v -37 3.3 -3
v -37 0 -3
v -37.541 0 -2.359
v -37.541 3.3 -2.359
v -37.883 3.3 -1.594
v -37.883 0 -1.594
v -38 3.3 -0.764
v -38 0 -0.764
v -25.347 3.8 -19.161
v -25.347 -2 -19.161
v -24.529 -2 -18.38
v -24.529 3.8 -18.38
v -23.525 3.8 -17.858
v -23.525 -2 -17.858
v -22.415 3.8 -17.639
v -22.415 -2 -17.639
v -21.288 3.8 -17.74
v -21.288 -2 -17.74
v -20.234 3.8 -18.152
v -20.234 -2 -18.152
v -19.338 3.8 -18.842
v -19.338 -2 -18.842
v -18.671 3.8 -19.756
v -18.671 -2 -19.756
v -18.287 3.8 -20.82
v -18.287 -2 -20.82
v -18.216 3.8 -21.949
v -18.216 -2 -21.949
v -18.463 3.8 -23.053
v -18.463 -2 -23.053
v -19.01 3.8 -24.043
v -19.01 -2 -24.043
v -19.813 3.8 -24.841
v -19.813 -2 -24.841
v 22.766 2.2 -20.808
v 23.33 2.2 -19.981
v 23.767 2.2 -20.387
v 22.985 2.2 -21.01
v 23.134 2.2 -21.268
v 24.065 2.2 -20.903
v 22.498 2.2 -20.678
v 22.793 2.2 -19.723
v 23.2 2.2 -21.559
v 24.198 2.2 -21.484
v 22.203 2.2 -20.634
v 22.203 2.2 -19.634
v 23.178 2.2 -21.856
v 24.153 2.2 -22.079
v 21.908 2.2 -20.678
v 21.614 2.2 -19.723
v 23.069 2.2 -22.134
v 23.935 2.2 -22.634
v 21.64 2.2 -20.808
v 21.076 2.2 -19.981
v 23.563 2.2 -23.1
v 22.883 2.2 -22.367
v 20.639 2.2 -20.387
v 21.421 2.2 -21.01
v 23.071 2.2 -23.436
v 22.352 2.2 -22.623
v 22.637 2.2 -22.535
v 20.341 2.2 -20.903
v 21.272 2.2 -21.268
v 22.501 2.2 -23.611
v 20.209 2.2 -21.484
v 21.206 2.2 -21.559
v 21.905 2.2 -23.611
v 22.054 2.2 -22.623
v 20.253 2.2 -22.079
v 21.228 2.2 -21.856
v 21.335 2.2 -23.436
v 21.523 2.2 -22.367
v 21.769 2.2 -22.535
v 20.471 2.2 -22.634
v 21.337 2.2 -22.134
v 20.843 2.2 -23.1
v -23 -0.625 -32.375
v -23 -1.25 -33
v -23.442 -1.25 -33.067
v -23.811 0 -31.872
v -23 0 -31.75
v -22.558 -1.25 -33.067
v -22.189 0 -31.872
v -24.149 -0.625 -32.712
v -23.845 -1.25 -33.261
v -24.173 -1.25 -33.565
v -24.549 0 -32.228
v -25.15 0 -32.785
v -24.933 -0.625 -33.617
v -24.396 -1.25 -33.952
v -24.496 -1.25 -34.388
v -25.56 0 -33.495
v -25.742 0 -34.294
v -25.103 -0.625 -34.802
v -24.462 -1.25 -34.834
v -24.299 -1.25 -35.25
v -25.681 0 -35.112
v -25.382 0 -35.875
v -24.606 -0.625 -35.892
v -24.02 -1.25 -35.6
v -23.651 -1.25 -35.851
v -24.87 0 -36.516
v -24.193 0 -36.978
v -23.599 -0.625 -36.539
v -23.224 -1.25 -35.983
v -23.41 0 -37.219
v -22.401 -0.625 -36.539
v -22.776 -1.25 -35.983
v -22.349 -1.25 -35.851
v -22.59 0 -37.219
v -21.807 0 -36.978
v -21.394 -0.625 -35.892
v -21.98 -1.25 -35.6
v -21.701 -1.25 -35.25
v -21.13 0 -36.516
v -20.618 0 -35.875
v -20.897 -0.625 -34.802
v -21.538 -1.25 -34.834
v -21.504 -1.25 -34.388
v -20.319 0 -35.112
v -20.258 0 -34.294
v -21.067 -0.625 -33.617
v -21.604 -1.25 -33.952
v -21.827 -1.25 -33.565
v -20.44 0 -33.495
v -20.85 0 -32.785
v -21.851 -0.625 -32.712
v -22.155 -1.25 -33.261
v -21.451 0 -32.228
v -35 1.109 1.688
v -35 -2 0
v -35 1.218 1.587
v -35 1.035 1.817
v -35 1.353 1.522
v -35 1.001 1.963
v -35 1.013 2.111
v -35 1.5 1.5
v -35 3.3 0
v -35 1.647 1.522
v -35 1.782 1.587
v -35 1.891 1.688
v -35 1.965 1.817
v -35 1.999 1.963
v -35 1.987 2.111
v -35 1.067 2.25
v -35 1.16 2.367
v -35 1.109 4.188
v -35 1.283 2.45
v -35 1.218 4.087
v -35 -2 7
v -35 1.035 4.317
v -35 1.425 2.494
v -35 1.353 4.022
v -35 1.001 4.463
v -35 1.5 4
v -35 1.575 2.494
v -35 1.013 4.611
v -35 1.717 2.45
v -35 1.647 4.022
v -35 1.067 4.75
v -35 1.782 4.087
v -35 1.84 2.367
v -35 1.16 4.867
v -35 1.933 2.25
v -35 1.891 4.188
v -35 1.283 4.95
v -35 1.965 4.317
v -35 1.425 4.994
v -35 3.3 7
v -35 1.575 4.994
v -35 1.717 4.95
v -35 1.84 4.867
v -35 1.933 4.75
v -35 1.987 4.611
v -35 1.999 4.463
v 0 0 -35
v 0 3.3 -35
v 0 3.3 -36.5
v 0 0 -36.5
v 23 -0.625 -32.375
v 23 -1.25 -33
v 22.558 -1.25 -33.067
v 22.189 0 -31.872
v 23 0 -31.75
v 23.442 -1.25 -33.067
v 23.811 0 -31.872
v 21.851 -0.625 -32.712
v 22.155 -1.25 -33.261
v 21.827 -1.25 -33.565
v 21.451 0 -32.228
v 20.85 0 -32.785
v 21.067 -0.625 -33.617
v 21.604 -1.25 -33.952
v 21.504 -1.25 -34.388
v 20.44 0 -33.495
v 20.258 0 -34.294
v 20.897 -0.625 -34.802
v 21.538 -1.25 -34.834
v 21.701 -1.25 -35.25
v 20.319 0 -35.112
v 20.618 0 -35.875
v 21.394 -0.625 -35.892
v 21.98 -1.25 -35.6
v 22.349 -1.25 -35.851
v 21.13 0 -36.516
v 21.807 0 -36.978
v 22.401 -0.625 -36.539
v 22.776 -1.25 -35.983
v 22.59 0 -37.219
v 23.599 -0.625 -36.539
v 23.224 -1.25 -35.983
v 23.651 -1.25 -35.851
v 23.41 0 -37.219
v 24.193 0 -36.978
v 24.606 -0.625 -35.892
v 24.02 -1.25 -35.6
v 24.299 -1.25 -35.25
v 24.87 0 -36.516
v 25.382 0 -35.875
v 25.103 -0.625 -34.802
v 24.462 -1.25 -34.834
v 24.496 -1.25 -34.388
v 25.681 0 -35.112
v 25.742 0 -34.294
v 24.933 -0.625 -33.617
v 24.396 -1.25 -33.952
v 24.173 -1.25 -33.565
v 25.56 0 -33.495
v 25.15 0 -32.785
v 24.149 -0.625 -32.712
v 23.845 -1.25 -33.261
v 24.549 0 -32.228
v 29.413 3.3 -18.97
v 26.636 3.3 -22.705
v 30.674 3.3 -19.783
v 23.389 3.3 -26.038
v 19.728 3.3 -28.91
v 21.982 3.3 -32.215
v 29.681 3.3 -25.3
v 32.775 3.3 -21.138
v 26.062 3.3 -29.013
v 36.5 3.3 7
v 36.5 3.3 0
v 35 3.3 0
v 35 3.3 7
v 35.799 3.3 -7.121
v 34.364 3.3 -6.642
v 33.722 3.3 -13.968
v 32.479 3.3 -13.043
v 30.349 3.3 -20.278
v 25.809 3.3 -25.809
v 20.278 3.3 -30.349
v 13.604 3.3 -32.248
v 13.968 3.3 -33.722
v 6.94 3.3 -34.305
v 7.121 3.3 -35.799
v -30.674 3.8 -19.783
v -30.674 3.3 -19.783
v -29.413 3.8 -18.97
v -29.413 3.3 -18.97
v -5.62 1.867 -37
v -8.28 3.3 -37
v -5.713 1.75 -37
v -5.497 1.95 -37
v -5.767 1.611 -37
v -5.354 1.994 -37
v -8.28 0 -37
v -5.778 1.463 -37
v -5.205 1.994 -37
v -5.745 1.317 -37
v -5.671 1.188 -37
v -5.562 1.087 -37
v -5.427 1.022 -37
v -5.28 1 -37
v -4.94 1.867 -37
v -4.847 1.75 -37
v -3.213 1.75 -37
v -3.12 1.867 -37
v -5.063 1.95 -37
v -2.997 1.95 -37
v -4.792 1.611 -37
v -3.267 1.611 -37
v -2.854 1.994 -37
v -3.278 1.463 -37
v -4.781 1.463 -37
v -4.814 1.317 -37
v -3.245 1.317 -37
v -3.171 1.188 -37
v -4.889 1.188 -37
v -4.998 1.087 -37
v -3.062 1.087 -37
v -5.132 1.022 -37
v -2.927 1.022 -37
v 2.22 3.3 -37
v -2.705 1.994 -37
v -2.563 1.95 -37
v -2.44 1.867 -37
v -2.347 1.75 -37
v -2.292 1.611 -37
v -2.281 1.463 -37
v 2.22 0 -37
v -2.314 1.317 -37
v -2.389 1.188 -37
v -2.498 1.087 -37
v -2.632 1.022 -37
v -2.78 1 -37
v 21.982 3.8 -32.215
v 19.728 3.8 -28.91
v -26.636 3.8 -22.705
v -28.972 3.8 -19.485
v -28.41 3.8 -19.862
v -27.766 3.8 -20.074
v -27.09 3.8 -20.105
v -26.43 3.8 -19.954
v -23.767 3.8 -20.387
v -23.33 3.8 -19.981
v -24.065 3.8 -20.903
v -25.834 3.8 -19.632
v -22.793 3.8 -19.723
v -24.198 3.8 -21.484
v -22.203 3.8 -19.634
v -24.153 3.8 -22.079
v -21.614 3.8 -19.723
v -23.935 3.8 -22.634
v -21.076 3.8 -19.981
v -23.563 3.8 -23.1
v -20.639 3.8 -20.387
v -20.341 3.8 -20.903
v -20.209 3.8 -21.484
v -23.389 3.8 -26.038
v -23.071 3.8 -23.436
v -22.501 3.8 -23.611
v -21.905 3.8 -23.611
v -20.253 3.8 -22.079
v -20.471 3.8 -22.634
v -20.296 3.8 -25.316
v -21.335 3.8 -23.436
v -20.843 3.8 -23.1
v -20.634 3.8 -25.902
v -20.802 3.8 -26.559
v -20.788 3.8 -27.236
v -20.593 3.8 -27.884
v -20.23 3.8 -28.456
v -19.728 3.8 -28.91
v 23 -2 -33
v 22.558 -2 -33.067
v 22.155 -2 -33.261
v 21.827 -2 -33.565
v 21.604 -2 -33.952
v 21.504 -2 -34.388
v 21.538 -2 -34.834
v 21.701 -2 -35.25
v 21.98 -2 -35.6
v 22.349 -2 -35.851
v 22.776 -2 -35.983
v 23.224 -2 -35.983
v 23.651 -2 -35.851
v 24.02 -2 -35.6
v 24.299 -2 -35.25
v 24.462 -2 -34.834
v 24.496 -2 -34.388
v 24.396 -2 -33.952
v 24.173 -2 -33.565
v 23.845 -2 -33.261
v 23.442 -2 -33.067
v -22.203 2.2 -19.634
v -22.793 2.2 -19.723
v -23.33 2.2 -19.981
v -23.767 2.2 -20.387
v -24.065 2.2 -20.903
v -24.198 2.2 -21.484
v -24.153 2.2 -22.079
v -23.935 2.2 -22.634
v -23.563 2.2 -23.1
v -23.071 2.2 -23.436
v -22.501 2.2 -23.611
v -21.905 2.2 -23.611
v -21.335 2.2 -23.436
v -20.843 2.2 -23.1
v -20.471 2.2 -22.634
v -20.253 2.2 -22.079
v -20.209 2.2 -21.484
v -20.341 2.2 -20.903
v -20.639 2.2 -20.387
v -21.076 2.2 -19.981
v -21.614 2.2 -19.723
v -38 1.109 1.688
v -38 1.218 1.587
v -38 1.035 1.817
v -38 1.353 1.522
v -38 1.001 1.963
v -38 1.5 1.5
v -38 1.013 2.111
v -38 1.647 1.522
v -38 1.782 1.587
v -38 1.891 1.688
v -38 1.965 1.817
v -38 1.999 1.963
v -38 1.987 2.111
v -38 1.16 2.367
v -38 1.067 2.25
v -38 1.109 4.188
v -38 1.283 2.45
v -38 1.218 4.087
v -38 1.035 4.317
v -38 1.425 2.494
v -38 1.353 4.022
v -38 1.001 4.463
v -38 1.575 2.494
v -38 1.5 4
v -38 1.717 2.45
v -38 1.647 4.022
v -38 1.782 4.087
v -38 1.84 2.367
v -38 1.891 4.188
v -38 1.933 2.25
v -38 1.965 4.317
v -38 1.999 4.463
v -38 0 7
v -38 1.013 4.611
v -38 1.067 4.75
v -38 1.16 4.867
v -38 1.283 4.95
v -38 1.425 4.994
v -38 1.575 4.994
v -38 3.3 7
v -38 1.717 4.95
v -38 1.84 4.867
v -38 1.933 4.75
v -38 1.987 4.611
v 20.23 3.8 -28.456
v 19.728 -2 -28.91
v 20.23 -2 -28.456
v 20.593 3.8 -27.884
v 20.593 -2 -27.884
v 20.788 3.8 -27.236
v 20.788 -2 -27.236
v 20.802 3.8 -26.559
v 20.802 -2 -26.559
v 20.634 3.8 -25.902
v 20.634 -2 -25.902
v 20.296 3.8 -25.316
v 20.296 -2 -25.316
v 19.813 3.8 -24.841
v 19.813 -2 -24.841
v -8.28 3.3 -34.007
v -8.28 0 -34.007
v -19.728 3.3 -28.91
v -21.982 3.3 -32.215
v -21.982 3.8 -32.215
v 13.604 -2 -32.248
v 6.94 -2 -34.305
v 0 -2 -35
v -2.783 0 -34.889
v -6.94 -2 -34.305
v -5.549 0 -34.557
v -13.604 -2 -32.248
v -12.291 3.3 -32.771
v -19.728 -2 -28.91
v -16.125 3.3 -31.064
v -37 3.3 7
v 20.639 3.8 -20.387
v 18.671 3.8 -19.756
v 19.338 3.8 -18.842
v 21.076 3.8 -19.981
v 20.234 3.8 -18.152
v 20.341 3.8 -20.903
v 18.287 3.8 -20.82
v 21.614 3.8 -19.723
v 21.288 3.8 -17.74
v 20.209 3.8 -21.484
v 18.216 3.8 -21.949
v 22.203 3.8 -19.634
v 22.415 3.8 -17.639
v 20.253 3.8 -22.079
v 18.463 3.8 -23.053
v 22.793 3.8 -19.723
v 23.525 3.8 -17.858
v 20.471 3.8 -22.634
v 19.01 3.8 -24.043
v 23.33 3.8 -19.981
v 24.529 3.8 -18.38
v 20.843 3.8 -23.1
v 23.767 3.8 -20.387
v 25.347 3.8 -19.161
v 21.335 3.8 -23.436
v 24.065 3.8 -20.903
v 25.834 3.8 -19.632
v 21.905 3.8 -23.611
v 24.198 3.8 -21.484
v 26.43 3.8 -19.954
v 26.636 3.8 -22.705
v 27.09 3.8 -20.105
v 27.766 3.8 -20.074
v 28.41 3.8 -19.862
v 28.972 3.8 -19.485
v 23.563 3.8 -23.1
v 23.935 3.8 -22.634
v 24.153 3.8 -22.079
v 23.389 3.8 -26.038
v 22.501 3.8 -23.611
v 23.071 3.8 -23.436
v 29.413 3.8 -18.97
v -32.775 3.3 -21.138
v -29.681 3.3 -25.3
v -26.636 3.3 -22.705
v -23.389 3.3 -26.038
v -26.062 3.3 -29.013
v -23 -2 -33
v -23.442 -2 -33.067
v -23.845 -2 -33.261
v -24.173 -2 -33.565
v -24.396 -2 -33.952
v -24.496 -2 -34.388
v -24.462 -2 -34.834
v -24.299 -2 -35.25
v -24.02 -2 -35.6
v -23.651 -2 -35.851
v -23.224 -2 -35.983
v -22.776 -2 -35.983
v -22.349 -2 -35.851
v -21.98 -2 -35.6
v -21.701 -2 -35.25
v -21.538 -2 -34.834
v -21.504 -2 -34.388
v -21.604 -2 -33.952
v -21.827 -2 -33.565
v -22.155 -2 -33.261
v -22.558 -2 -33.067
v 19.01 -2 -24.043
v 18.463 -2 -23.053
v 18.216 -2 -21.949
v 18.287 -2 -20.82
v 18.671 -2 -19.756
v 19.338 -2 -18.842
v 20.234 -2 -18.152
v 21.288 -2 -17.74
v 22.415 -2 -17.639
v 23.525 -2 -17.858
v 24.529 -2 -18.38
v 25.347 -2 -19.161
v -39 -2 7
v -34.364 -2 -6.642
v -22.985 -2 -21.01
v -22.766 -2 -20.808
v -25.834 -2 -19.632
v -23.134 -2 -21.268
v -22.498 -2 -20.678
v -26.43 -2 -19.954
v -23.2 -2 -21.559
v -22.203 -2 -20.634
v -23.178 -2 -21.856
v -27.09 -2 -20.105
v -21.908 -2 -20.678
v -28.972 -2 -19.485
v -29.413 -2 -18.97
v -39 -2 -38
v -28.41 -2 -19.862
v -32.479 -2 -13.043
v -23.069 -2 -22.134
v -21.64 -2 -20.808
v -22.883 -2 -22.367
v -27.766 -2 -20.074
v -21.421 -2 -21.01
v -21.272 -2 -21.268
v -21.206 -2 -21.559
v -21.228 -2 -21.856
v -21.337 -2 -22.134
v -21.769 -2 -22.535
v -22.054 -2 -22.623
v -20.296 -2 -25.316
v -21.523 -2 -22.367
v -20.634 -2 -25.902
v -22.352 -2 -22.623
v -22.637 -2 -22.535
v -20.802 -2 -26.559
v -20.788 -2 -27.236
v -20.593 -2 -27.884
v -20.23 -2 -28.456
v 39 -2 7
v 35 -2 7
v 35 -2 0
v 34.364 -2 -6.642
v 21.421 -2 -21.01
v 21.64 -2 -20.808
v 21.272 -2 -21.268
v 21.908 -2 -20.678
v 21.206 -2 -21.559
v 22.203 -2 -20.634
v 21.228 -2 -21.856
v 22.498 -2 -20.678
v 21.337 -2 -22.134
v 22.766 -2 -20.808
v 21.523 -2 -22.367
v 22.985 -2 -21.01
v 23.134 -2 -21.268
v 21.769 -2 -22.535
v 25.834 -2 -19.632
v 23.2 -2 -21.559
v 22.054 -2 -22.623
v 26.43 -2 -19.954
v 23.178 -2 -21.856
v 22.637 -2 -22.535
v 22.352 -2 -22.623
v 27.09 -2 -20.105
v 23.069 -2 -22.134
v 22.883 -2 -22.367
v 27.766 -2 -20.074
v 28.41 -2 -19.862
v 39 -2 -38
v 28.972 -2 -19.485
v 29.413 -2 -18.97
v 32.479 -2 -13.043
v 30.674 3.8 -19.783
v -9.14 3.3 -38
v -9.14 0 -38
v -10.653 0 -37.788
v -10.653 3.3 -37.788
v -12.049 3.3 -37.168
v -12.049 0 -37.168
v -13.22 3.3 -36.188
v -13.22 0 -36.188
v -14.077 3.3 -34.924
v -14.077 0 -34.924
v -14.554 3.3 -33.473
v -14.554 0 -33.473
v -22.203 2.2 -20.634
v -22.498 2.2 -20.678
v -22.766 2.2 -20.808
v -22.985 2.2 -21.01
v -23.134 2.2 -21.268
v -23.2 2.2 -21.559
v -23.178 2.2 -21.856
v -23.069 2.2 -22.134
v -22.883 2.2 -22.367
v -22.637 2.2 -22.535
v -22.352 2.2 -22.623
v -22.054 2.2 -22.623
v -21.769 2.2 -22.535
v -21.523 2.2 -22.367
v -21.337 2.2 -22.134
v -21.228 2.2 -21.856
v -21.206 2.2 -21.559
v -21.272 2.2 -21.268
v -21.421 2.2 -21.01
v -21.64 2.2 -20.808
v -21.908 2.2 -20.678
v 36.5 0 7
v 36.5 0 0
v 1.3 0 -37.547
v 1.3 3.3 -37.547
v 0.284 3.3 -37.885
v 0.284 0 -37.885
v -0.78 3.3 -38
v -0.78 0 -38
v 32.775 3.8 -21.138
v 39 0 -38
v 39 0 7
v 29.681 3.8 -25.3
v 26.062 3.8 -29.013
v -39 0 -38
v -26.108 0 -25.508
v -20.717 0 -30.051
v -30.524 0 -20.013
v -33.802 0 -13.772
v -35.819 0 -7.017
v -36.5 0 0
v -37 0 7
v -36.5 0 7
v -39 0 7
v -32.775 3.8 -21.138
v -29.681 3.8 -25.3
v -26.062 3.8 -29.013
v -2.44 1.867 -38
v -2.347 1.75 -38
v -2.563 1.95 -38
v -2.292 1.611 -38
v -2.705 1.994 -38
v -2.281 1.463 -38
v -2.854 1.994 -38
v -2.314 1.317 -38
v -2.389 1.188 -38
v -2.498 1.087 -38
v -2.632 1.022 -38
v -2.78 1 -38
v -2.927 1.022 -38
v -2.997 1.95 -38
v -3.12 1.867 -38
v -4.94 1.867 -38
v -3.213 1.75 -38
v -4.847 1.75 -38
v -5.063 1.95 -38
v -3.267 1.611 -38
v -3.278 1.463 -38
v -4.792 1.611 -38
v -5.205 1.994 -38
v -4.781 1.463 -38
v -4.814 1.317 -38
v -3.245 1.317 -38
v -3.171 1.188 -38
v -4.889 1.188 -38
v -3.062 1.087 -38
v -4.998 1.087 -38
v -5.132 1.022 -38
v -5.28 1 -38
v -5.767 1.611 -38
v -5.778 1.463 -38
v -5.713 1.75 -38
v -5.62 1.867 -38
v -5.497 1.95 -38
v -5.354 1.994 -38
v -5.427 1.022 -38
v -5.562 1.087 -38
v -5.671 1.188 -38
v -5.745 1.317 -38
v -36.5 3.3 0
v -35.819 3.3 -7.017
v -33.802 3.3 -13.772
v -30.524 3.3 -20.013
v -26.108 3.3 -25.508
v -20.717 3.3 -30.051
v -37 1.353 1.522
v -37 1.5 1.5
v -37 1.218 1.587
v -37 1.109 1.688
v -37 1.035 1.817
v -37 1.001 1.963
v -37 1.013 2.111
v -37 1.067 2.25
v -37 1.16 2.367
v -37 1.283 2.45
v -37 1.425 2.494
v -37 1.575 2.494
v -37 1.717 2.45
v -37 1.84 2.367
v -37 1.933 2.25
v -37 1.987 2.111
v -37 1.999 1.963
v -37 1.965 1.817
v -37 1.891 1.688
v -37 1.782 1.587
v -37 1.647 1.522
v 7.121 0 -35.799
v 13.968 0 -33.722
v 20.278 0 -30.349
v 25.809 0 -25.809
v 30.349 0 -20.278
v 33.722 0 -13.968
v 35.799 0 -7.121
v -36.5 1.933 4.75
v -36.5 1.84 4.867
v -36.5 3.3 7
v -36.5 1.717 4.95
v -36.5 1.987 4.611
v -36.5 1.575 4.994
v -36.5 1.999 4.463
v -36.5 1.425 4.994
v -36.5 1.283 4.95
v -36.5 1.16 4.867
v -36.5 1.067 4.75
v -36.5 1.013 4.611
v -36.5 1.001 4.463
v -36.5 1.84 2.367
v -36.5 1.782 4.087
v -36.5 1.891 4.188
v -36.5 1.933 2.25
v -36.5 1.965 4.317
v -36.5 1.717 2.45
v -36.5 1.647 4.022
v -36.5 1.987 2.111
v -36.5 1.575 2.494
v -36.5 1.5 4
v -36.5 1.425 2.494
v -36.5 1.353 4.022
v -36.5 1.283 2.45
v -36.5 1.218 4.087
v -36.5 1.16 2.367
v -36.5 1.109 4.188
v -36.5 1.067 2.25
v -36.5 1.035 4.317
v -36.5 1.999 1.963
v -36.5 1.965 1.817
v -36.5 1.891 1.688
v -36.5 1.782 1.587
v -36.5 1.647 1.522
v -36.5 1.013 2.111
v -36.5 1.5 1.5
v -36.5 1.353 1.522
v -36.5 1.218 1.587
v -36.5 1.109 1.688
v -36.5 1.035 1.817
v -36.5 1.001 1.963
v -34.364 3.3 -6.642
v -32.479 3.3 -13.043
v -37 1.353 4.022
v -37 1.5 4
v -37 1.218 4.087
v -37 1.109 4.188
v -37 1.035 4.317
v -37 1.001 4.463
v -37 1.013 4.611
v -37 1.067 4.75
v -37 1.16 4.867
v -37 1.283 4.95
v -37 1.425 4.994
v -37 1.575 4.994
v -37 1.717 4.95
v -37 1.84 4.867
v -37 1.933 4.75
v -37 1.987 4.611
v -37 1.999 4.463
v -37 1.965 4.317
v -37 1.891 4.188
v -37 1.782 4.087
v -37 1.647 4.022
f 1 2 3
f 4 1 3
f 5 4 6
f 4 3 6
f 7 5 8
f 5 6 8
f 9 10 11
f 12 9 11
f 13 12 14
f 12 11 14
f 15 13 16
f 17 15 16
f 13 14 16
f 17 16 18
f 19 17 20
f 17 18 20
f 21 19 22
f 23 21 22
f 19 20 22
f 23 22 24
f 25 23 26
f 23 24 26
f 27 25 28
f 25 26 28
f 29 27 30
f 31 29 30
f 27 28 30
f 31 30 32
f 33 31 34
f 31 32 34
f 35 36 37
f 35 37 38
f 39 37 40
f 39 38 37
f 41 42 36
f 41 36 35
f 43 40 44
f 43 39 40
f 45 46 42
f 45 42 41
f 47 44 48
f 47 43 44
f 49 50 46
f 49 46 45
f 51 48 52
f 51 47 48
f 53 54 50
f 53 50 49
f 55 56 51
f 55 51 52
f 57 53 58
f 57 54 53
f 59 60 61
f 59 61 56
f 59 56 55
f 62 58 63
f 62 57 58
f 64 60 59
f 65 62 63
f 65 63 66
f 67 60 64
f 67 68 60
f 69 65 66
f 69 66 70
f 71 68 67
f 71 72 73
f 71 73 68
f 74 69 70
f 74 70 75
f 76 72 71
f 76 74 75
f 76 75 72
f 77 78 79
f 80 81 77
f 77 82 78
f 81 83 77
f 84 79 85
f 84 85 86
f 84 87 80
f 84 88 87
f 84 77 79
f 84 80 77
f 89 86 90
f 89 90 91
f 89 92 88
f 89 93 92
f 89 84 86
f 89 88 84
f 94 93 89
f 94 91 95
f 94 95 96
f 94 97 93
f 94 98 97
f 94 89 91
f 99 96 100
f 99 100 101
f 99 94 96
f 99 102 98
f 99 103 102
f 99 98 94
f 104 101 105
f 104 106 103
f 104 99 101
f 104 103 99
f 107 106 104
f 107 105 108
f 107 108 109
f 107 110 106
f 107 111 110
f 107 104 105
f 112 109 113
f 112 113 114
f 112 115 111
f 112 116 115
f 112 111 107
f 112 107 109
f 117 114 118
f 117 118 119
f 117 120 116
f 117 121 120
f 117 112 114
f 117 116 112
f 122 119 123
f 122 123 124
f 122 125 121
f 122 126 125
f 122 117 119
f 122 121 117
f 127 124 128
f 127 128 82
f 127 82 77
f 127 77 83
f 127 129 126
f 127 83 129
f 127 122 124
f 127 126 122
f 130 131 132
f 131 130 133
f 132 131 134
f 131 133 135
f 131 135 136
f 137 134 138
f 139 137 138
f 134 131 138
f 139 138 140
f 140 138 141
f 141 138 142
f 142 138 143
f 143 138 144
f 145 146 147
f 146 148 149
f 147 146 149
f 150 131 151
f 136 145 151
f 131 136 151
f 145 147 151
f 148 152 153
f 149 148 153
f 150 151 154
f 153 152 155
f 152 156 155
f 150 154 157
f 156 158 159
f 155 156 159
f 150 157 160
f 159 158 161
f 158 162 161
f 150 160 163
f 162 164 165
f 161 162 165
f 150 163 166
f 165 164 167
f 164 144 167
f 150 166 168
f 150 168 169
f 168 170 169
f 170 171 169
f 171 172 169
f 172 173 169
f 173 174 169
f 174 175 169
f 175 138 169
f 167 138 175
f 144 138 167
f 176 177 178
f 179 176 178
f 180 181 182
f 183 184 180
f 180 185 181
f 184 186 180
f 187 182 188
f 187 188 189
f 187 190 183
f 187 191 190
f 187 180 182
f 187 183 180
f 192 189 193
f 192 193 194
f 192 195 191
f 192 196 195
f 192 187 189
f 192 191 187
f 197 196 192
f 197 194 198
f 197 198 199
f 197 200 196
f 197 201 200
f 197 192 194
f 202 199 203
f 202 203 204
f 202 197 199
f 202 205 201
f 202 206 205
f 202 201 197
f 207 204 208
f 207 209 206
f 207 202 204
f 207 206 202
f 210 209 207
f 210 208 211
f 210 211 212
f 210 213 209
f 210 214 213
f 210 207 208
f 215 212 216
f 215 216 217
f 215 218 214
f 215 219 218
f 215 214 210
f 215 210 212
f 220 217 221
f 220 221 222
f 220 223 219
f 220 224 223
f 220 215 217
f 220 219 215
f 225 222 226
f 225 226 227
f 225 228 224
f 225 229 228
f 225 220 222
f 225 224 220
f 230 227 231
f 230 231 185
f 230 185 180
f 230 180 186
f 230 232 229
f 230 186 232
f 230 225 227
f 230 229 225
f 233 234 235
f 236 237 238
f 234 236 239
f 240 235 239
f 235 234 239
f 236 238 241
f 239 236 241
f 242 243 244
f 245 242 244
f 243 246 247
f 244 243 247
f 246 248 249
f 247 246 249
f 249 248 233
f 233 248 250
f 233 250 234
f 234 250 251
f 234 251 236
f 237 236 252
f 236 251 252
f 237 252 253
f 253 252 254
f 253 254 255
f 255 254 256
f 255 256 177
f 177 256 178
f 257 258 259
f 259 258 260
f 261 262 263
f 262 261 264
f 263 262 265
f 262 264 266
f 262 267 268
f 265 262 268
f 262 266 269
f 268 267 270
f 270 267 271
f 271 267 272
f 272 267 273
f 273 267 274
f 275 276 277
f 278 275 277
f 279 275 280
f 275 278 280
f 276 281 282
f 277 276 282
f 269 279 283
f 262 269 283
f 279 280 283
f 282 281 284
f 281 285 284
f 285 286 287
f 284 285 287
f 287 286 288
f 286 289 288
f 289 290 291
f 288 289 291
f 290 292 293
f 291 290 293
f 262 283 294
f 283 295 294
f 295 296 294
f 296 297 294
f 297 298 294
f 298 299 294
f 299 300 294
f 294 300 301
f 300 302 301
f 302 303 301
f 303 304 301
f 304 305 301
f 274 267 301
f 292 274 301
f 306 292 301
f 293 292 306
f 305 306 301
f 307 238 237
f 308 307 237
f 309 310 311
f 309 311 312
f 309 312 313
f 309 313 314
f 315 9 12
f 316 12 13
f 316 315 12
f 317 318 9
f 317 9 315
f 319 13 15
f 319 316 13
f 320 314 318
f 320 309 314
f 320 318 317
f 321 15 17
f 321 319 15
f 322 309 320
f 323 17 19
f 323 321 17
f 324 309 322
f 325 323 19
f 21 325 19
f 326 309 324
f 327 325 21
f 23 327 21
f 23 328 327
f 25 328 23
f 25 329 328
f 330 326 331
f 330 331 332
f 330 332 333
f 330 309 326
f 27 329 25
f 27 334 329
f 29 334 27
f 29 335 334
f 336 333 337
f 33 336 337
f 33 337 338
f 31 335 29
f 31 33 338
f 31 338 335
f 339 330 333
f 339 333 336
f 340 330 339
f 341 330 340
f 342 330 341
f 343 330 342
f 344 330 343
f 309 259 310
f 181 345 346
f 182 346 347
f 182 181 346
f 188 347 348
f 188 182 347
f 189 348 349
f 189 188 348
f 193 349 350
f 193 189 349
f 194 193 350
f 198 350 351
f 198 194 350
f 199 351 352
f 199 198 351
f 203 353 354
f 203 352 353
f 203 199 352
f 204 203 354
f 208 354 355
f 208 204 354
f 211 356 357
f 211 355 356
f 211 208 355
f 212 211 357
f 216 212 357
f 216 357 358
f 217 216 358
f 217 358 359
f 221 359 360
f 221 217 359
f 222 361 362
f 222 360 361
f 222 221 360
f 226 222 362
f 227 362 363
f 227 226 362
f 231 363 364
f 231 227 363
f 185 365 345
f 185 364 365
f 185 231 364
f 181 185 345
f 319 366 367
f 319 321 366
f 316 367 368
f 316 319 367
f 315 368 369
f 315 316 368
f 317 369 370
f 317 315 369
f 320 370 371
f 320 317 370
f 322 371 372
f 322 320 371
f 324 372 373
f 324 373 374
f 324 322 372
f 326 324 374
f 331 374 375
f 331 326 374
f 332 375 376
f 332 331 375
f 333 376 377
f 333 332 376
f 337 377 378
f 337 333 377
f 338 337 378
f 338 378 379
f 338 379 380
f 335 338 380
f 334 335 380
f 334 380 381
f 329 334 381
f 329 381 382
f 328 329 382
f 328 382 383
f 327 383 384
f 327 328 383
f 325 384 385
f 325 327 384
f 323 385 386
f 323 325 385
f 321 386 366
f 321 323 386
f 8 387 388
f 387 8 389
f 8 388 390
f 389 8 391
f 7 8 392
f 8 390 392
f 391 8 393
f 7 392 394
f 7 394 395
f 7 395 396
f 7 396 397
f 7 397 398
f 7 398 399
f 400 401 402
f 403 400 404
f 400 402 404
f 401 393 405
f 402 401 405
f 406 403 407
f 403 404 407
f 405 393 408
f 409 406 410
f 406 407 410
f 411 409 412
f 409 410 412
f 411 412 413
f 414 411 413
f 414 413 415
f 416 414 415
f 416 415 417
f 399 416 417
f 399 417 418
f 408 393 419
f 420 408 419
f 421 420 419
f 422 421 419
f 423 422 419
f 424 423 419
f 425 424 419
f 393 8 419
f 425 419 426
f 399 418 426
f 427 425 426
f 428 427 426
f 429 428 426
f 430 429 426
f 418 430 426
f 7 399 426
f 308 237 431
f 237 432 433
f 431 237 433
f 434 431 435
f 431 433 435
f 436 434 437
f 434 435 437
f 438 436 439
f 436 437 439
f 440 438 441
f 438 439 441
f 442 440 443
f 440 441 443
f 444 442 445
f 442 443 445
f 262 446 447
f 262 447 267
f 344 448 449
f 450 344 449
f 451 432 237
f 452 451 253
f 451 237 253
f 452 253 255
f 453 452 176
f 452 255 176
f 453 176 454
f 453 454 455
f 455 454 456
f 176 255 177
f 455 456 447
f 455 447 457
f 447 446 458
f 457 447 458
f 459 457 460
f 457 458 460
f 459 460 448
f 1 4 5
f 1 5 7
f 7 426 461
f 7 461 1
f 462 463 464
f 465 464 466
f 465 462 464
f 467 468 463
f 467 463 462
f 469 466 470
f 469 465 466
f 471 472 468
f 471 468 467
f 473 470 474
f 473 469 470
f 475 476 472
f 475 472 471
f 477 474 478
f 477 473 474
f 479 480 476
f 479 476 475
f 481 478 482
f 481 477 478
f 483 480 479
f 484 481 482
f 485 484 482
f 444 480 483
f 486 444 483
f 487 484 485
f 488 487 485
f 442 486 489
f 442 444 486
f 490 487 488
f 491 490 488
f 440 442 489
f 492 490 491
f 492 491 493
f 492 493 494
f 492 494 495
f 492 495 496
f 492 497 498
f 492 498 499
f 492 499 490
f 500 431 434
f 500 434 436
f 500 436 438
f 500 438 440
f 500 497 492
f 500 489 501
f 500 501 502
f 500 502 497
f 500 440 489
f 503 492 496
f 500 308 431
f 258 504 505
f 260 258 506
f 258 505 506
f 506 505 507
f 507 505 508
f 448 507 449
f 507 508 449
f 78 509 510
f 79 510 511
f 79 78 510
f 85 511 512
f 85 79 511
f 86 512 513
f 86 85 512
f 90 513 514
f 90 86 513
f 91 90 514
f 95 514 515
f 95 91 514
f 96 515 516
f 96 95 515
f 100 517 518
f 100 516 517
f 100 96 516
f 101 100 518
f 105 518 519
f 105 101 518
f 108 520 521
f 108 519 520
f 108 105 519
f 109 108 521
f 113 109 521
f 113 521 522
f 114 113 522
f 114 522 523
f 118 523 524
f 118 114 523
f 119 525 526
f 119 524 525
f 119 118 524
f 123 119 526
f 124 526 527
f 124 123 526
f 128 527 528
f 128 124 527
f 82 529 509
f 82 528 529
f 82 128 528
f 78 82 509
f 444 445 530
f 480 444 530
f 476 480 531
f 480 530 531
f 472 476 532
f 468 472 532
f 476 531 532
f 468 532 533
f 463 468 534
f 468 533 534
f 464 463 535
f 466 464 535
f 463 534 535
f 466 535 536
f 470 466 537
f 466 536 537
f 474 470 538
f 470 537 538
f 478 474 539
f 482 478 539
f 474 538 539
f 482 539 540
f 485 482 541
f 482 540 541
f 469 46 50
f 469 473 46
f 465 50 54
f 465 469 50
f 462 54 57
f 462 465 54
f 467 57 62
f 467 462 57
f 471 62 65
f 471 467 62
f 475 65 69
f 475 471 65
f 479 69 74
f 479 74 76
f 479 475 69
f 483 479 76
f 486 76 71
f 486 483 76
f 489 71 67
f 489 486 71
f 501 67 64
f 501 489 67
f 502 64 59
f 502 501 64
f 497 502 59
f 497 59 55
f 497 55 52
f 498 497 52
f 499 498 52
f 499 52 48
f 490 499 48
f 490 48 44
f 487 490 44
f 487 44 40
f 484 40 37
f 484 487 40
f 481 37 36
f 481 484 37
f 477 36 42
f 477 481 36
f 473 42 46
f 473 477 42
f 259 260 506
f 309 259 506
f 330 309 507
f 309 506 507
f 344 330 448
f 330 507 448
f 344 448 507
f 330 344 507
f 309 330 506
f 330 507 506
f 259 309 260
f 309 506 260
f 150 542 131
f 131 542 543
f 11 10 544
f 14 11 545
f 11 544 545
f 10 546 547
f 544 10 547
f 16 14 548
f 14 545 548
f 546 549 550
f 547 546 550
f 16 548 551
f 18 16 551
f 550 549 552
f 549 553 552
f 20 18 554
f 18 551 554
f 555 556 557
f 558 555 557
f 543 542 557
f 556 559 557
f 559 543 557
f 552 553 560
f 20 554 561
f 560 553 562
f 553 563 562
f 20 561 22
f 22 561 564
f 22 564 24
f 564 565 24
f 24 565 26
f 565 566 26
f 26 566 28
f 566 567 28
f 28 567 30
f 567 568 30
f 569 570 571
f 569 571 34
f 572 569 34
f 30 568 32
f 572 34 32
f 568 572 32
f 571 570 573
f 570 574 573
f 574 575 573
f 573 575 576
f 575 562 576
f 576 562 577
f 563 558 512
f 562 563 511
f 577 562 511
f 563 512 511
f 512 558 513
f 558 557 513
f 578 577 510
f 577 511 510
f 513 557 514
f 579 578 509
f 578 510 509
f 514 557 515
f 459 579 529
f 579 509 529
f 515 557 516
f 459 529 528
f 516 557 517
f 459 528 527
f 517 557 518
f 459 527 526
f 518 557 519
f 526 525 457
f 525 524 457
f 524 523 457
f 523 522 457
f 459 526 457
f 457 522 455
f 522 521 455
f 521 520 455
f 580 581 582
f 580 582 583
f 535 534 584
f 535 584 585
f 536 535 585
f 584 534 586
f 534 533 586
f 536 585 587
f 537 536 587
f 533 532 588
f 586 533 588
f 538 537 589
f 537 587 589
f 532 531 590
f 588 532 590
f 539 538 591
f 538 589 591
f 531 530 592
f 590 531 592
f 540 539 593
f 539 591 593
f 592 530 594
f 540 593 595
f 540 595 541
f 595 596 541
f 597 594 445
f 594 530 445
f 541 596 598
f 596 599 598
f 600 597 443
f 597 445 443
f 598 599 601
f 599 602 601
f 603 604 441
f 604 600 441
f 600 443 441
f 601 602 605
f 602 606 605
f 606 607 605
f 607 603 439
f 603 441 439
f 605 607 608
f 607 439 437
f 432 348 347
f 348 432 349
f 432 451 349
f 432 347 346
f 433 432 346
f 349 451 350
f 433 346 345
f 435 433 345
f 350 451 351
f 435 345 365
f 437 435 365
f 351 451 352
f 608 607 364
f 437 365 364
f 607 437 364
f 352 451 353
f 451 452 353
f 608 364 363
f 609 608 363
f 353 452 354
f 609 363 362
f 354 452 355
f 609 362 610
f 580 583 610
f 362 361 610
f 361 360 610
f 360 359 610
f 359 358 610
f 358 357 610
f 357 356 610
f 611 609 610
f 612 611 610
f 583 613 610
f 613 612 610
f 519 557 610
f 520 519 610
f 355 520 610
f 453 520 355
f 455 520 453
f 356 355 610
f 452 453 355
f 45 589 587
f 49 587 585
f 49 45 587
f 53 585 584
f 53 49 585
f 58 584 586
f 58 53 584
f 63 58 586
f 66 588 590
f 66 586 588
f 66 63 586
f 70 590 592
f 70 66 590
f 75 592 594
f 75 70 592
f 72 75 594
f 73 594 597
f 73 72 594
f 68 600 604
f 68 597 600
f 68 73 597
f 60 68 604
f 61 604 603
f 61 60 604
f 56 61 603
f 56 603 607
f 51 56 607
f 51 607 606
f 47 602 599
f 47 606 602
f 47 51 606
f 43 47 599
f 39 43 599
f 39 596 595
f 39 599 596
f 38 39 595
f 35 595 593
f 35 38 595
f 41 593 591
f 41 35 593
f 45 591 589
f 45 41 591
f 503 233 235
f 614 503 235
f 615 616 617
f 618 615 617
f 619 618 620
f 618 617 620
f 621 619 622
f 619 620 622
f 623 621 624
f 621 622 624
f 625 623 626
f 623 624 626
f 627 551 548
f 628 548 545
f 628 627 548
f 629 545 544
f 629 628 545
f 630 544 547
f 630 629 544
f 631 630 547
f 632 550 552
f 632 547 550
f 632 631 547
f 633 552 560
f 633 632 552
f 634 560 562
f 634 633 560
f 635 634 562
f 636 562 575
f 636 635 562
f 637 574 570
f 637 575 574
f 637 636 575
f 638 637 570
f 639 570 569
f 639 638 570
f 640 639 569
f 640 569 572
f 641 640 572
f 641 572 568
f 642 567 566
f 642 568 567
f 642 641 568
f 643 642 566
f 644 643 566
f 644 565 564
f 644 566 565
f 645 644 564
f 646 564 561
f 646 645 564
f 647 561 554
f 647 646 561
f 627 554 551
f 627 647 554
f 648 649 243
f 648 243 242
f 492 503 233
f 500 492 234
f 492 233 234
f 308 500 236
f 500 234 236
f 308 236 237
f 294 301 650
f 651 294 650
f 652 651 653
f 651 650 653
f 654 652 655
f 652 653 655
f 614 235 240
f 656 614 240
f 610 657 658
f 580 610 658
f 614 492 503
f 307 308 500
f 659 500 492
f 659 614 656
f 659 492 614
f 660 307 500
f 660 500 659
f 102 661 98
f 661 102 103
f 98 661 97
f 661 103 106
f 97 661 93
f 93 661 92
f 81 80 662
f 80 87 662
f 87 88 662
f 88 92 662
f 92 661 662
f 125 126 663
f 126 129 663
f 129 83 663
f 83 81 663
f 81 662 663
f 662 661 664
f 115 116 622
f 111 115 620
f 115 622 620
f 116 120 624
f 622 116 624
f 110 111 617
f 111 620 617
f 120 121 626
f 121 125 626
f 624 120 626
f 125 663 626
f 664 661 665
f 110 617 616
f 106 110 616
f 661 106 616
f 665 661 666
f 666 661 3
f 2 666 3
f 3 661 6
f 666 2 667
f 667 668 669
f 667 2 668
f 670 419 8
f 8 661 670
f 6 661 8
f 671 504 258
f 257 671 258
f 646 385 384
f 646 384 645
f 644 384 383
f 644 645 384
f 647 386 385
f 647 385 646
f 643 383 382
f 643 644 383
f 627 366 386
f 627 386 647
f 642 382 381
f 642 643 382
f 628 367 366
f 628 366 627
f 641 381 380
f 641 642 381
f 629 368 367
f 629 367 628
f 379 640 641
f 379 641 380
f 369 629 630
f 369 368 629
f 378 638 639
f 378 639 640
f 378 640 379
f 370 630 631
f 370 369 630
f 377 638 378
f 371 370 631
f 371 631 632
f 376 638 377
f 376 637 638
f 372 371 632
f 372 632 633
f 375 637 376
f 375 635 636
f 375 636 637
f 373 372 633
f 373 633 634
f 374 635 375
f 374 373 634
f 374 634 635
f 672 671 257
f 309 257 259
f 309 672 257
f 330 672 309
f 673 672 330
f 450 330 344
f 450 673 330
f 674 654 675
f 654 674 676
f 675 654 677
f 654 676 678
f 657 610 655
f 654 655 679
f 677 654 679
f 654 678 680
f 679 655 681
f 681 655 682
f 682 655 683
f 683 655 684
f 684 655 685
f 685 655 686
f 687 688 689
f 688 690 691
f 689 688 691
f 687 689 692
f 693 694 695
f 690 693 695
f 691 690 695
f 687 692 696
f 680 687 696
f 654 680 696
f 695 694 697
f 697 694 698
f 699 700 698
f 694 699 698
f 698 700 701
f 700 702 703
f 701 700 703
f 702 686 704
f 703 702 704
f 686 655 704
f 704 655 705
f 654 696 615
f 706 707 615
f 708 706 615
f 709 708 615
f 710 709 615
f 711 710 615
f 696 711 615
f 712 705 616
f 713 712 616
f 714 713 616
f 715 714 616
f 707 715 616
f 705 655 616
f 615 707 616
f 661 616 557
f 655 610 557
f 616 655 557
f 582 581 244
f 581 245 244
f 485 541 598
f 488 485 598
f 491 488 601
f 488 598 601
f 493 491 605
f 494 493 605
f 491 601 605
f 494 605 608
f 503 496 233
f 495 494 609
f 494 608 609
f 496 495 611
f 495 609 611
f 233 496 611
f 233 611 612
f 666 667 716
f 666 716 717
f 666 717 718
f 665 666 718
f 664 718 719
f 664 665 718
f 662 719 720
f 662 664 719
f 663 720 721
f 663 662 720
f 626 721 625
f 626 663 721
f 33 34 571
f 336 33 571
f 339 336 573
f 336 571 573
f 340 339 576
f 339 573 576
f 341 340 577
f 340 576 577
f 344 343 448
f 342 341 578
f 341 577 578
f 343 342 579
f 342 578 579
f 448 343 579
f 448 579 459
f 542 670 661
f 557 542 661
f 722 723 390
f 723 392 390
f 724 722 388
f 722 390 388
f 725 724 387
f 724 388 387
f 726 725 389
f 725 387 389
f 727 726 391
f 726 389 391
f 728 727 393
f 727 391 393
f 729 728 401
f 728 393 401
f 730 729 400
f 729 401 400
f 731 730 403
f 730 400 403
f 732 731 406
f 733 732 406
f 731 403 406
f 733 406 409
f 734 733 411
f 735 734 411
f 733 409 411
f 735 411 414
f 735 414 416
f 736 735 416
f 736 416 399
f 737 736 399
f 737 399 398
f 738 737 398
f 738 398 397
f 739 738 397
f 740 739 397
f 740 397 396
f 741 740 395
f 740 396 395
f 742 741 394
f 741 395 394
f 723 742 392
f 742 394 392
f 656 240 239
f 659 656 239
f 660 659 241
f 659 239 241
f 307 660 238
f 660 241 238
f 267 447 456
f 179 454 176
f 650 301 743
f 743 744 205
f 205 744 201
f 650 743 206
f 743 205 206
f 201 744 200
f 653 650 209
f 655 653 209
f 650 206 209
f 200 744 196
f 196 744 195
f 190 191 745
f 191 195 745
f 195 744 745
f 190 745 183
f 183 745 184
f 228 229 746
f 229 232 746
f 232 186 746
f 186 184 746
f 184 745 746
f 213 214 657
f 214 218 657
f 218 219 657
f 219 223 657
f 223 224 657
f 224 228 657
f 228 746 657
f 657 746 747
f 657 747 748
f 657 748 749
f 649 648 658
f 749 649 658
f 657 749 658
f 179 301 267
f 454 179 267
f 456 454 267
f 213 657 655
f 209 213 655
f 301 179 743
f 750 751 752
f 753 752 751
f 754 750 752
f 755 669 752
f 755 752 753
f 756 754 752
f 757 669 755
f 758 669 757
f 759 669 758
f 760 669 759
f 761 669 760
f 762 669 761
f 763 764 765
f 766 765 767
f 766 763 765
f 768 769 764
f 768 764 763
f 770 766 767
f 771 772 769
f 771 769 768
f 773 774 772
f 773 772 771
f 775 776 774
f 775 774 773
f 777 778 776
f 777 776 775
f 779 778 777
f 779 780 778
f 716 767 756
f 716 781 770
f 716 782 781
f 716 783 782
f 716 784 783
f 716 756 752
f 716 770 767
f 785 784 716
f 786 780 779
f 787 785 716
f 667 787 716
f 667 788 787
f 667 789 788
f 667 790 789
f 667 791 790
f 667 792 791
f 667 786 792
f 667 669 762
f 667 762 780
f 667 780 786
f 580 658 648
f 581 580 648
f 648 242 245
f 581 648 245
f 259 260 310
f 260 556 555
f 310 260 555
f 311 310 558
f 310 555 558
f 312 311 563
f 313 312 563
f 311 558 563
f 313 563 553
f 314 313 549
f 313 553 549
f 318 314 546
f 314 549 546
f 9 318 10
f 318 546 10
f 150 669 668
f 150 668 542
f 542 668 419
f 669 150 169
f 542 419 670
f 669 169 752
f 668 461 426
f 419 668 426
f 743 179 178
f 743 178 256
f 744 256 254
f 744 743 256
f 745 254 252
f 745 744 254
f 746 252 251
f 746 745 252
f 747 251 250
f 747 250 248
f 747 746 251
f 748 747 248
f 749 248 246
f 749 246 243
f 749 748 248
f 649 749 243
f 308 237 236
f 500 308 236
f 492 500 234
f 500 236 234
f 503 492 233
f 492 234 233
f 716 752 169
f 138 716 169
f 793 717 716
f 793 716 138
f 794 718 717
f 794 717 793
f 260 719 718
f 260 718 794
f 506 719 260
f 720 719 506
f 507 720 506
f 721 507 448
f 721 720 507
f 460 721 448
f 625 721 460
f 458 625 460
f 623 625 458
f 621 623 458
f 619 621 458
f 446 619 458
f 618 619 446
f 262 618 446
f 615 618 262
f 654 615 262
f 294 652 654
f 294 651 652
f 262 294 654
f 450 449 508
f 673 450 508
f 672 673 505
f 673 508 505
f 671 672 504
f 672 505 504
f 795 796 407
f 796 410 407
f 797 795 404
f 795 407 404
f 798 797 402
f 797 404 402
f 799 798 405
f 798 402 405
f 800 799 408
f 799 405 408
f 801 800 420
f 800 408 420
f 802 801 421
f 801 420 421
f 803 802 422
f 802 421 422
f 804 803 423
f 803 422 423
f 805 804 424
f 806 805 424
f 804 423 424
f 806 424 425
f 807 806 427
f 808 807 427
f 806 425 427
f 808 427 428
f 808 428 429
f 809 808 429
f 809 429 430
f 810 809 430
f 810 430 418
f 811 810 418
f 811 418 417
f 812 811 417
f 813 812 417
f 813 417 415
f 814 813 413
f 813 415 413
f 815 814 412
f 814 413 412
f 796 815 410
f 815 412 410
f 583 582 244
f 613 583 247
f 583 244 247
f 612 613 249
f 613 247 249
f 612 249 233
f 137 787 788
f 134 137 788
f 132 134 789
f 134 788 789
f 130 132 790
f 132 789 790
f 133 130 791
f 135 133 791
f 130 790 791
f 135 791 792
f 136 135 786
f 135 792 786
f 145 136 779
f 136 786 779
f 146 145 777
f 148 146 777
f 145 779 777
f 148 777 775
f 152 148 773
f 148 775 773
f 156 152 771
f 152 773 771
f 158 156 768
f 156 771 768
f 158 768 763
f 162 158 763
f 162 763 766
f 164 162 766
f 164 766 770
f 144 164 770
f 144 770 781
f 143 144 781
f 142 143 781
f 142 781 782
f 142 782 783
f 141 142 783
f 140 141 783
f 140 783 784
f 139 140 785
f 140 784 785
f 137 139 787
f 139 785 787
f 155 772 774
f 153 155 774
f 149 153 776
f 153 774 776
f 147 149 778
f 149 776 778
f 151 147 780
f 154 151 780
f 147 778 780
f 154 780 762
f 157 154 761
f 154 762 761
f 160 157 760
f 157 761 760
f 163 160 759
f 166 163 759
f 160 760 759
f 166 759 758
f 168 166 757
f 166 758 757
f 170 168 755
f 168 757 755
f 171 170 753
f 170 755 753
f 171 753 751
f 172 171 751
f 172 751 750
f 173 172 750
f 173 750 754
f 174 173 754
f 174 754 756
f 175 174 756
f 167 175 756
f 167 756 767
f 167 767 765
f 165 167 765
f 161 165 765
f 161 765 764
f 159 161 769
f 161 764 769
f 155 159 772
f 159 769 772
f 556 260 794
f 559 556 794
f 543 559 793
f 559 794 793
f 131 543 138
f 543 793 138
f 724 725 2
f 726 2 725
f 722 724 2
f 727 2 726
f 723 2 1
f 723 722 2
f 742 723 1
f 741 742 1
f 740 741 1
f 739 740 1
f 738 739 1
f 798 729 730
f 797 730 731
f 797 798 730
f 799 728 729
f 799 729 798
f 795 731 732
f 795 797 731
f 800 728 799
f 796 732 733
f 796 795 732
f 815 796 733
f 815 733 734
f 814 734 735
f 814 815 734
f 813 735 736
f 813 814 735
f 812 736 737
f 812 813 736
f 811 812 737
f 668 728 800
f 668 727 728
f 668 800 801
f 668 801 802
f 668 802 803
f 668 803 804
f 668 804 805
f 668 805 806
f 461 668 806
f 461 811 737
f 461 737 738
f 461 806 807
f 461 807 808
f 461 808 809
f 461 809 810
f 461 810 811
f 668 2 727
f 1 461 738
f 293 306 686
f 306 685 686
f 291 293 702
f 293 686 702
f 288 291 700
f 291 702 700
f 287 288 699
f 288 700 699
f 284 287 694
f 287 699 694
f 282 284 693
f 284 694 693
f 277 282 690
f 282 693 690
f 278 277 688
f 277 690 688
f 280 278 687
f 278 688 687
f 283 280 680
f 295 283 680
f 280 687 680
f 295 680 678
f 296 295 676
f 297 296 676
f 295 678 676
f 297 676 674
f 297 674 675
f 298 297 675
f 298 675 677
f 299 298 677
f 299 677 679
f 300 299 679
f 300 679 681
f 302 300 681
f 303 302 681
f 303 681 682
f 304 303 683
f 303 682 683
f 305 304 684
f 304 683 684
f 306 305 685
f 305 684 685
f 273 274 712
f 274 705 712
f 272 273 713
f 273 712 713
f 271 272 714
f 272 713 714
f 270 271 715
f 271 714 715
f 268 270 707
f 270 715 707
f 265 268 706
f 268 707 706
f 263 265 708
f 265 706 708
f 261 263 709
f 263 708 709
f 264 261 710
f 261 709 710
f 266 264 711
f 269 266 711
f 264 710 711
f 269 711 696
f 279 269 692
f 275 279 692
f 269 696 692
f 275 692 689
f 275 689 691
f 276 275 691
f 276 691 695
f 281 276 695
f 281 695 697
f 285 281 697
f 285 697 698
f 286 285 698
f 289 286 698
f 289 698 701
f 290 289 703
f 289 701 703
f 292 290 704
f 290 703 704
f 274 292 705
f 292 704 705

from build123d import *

# Parameters (mm, degrees)
BOSS_EXTRUDE1_DEPTH                          = 3.3
BOSS_EXTRUDE2_DEPTH                          = 2
BOSS_EXTRUDE3_DEPTH                          = 0.5
BOSS_EXTRUDE3_DEPTH_BACK                     = 5.3
BOSS_EXTRUDE4_DEPTH                          = 0.5
CBORE_FOR_M2_PAN_HEAD_SCREW2_AT_2_COUNT      = 2
CBORE_FOR_M2_PAN_HEAD_SCREW2_AT_2_PITCH      = 44.406234465
SKETCH13_W                                   = 1
SKETCH13_H                                   = 3.494688162
BOSS_EXTRUDE5_DEPTH                          = 10
FILLET1_R                                    = 3
SKETCH15_W                                   = 8.279859514
SKETCH15_H                                   = 8.940793452
CUT_EXTRUDE2_DEPTH                           = 3.3
SKETCH19_W                                   = 0.5
SKETCH19_H                                   = 5
F_1_0_1_DIAMETER_HOLE2_AT_2_COUNT            = 2
F_1_0_1_DIAMETER_HOLE2_AT_2_PITCH            = 2.5
BOSS_EXTRUDE6_DEPTH                          = 3.3
FILLET2_R                                    = 5.5
CSK_FOR_M3_COUNTERSUNK_FLAT_HEAD_SCR_2_COUNT = 2
CSK_FOR_M3_COUNTERSUNK_FLAT_HEAD_SCR_2_PITCH = 46
FILLET3_R                                    = 5
SKETCH24_W                                   = 0.5
SKETCH24_H                                   = 1
F_1_0_1_DIAMETER_HOLE3_AT_2_COUNT            = 2
F_1_0_1_DIAMETER_HOLE3_AT_2_PITCH            = 2.5


with BuildPart() as part:
    # Sketch1 → Boss-Extrude1 (new body)
    with BuildSketch(Plane(origin=(0, 0, 0), x_dir=(1, 0, 0), z_dir=(0, 1, 0))):
        with BuildLine():
            Line((36.5, 0), (36.5, -7))
            Line((36.5, -7), (35, -7))
            Line((35, -7), (35, 0))
            ThreePointArc((35, 0), (0, 35), (-35, 0))
            Line((-35, 0), (-35, -7))
            Line((-35, -7), (-36.5, -7))
            Line((-36.5, -7), (-36.5, 0))
            ThreePointArc((-36.5, 0), (0, 36.5), (36.5, 0))
        make_face()
    extrude(amount=BOSS_EXTRUDE1_DEPTH)



with BuildPart() as body_2:
    # Sketch2 → Boss-Extrude2 (new body)
    with BuildSketch(Plane.XZ):
        with BuildLine():
            Line((-35, 7), (-39, 7))
            Line((-39, 7), (-39, -38))
            Line((-39, -38), (39, -38))
            Line((39, -38), (39, 7))
            Line((39, 7), (35, 7))
            Line((35, 7), (35, 0))
            ThreePointArc((35, 0), (0, -35), (-35, 0))
            Line((-35, 0), (-35, 7))
        make_face()
    extrude(amount=BOSS_EXTRUDE2_DEPTH)


with BuildPart() as part_1:
    add(part.part)

    add(body_2.part)  # Boss-Extrude3 merges body 2
    # Sketch3 → Boss-Extrude3 (add, two sides: drawn at the far end of the back side and taken through both)
    with BuildSketch(Plane(origin=(0, 3.3, 0), x_dir=(1, 0, 0), z_dir=(0, 1, 0)).offset(-BOSS_EXTRUDE3_DEPTH_BACK)):
        with BuildLine():
            ThreePointArc((-29.413030363, 18.970335918), (-27.429134486, 20.11257099), (-25.347106396, 19.160886774))
            ThreePointArc((-25.347106396, 19.160886774), (-19.33819888, 18.842347627), (-19.812679795, 24.840956181))
            ThreePointArc((-19.812679795, 24.840956181), (-20.81811257, 26.897567167), (-19.727783811, 28.91045738))
            ThreePointArc((-19.727783811, 28.91045738), (-25.068035585, 24.425265442), (-29.413030363, 18.970335918))
        make_face()
        with BuildLine():
            ThreePointArc((29.413030363, 18.970335918), (25.068035585, 24.425265442), (19.727783811, 28.91045738))
            ThreePointArc((19.727783811, 28.91045738), (20.81811257, 26.897567167), (19.812679795, 24.840956181))
            ThreePointArc((19.812679795, 24.840956181), (19.33819888, 18.842347627), (25.347106396, 19.160886774))
            ThreePointArc((25.347106396, 19.160886774), (27.429134486, 20.11257099), (29.413030363, 18.970335918))
        make_face()
    extrude(amount=BOSS_EXTRUDE3_DEPTH + BOSS_EXTRUDE3_DEPTH_BACK)

    # Sketch11 → CBORE for M2 Pan Head Screw2 (revolve, cut)
    with BuildSketch(Plane(origin=(-22.203117232, 3.8, -21.633806534), x_dir=(0, 0, 1), z_dir=(1, 0, 0))):
        Polygon((0, 0), (0, 30.600860619), (1, 30), (1, 1.6), (2, 1.6), (2, 0), align=None)
    cbore_for_m2_pan_head_screw2 = revolve(axis=Axis((-22.203117232, 10.15, -21.633806534), (0, -1, 0)), mode=Mode.SUBTRACT)

    # CBORE for M2 Pan Head Screw2 at 2: CBORE for M2 Pan Head Screw2 ×2
    with Locations(*[(i * CBORE_FOR_M2_PAN_HEAD_SCREW2_AT_2_PITCH, 0, 0) for i in range(1, CBORE_FOR_M2_PAN_HEAD_SCREW2_AT_2_COUNT)]):
        add(cbore_for_m2_pan_head_screw2, mode=Mode.SUBTRACT)

    # Sketch13 → Boss-Extrude5 (add)
    with BuildSketch(Plane.XY.offset(7)):
        with Locations((-37.5, 1.552655919)):
            Rectangle(SKETCH13_W, SKETCH13_H)
    extrude(amount=-BOSS_EXTRUDE5_DEPTH)

    # Fillet1
    # the kernel refuses this fillet: 3 mm, written as the material it takes off along each edge
    with BuildSketch(Plane(origin=(-38, 0, -3), x_dir=(0, 0, 1), z_dir=(0, 1, 0))) as fillet1_piece_1:
        with BuildLine():
            CenterArc((2.236067977, 3), FILLET1_R, 221.810314896, 48.189685104)
            Line((0, 1), (0, 0))
            Line((0, 0), (2.236067977, 0))
        make_face()
    extrude(amount=8.890169944, mode=Mode.SUBTRACT)

    # Sketch15 → Cut-Extrude2 (cut)
    with BuildSketch(Plane(origin=(0, 3.3, 0), x_dir=(1, 0, 0), z_dir=(0, 1, 0))):
        with Locations((-4.139929757, 32.029603274)):
            Rectangle(SKETCH15_W, SKETCH15_H)
    extrude(amount=-CUT_EXTRUDE2_DEPTH, mode=Mode.SUBTRACT)

    # Sketch19 → Ø1.0 (1) Diameter Hole2 (revolve, cut)
    with BuildSketch(Plane(origin=(-35, 1.5, 4.5), x_dir=(0, 0, -1), z_dir=(0, 1, 0))):
        with Locations((0.25, 2.5)):
            Rectangle(SKETCH19_W, SKETCH19_H)
    f_1_0_1_diameter_hole2 = revolve(axis=Axis((-28.65, 1.5, 4.5), (-1, 0, 0)), mode=Mode.SUBTRACT)

    # Ø1.0 (1) Diameter Hole2 at 2: Ø1.0 (1) Diameter Hole2 ×2
    with Locations(*[(0, 0, -i * F_1_0_1_DIAMETER_HOLE2_AT_2_PITCH) for i in range(1, F_1_0_1_DIAMETER_HOLE2_AT_2_COUNT)]):
        add(f_1_0_1_diameter_hole2, mode=Mode.SUBTRACT)

    # Sketch21 → Boss-Extrude6 (add)
    with BuildSketch(Plane(origin=(0, 0, 0), x_dir=(1, 0, 0), z_dir=(0, 1, 0))):
        Polygon((-0.279859514, 37), (2.220140486, 37), (2.220140486, 38), (-14.553693159, 38), (-14.553693159, 32.511000179), (-8.279859514, 34.006527703), (-8.279859514, 37), align=None)
    extrude(amount=BOSS_EXTRUDE6_DEPTH)

    # Fillet2
    # the kernel refuses this fillet: 5.5 mm, written as the material it takes off along each edge
    with BuildSketch(Plane(origin=(-14.553693159, 0, -38), x_dir=(0, 0, 1), z_dir=(0, 1, 0))) as fillet2_piece_1:
        with BuildLine():
            CenterArc((5.5, 5.413254179), FILLET2_R, 180, 79.810496336)
            Line((0, 5.413254179), (0, 0))
            Line((0, 0), (4.527025596, 0))
        make_face()
    extrude(amount=16.833135448, mode=Mode.SUBTRACT)

    # Sketch22 → CSK for M3 Countersunk Flat Head Screw1 (revolve, cut)
    with BuildSketch(Plane(origin=(-23, 0, -34.5), x_dir=(0, 0, 1), z_dir=(1, 0, 0))):
        Polygon((0, 0), (0, 2.001), (1.5, 2.001), (1.5, 1.25), (2.75, 0), align=None)
    csk_for_m3_countersunk_flat_head_screw1 = revolve(axis=Axis((-23, 6.35, -34.5), (0, -1, 0)), mode=Mode.SUBTRACT)

    # CSK for M3 Countersunk Flat Head Scr 2: CSK for M3 Countersunk Flat Head Screw1 ×2
    with Locations(*[(i * CSK_FOR_M3_COUNTERSUNK_FLAT_HEAD_SCR_2_PITCH, 0, 0) for i in range(1, CSK_FOR_M3_COUNTERSUNK_FLAT_HEAD_SCR_2_COUNT)]):
        add(csk_for_m3_countersunk_flat_head_screw1, mode=Mode.SUBTRACT)

    # Fillet3
    # the kernel refuses this fillet: 5 mm, written as the material it takes off along each edge
    with BuildSketch(Plane(origin=(2.220140486, 0, -38), x_dir=(0, 0, 1), z_dir=(0, 1, 0))) as fillet3_piece_1:
        with BuildLine():
            CenterArc((5, -3), FILLET3_R, 143.130102354, 36.869897646)
            Line((0, -3), (0, 0))
            Line((0, 0), (1, 0))
        make_face()
    extrude(amount=10.8, mode=Mode.SUBTRACT)

    # Sketch24 → Ø1.0 (1) Diameter Hole3 (revolve, cut)
    with BuildSketch(Plane(origin=(-5.279859514, 1.5, -37), x_dir=(0, -1, 0), z_dir=(1, 0, 0))):
        with Locations((0.25, 0.5)):
            Rectangle(SKETCH24_W, SKETCH24_H)
    f_1_0_1_diameter_hole3 = revolve(axis=Axis((-5.279859514, 1.5, -30.65), (0, 0, -1)), mode=Mode.SUBTRACT)

    # Ø1.0 (1) Diameter Hole3 at 2: Ø1.0 (1) Diameter Hole3 ×2
    with Locations(*[(i * F_1_0_1_DIAMETER_HOLE3_AT_2_PITCH, 0, 0) for i in range(1, F_1_0_1_DIAMETER_HOLE3_AT_2_COUNT)]):
        add(f_1_0_1_diameter_hole3, mode=Mode.SUBTRACT)


with BuildPart() as body_2_2:
    # Sketch9 → Boss-Extrude4 (new body)
    with BuildSketch(Plane(origin=(0, 3.3, 0), x_dir=(1, 0, 0), z_dir=(0, 1, 0))):
        with BuildLine():
            Line((-32.774519548, 21.138374309), (-30.673588807, 19.783350315))
            ThreePointArc((-30.673588807, 19.783350315), (-26.142379967, 25.472062532), (-20.57326026, 30.149476982))
            Line((-20.57326026, 30.149476982), (-21.982387675, 32.214509652))
            ThreePointArc((-21.982387675, 32.214509652), (-27.932953938, 27.21672435), (-32.774519548, 21.138374309))
        make_face()
        with BuildLine():
            Line((-30.673588807, 19.783350315), (-29.413030363, 18.970335918))
            ThreePointArc((-29.413030363, 18.970335918), (-25.068035585, 24.425265442), (-19.727783811, 28.91045738))
            Line((-19.727783811, 28.91045738), (-20.57326026, 30.149476982))
            ThreePointArc((-20.57326026, 30.149476982), (-26.142379967, 25.472062532), (-30.673588807, 19.783350315))
        make_face()
        with BuildLine():
            ThreePointArc((30.673588807, 19.783350315), (26.142379967, 25.472062532), (20.57326026, 30.149476982))
            Line((20.57326026, 30.149476982), (19.727783811, 28.91045738))
            ThreePointArc((19.727783811, 28.91045738), (25.068035585, 24.425265442), (29.413030363, 18.970335918))
            Line((29.413030363, 18.970335918), (30.673588807, 19.783350315))
        make_face()
        with BuildLine():
            Line((21.982387675, 32.214509652), (20.57326026, 30.149476982))
            ThreePointArc((20.57326026, 30.149476982), (26.142379967, 25.472062532), (30.673588807, 19.783350315))
            Line((30.673588807, 19.783350315), (32.774519548, 21.138374309))
            ThreePointArc((32.774519548, 21.138374309), (27.932953938, 27.21672435), (21.982387675, 32.214509652))
        make_face()
    extrude(amount=BOSS_EXTRUDE4_DEPTH)


solid = Compound([part_1.part, body_2_2.part])
